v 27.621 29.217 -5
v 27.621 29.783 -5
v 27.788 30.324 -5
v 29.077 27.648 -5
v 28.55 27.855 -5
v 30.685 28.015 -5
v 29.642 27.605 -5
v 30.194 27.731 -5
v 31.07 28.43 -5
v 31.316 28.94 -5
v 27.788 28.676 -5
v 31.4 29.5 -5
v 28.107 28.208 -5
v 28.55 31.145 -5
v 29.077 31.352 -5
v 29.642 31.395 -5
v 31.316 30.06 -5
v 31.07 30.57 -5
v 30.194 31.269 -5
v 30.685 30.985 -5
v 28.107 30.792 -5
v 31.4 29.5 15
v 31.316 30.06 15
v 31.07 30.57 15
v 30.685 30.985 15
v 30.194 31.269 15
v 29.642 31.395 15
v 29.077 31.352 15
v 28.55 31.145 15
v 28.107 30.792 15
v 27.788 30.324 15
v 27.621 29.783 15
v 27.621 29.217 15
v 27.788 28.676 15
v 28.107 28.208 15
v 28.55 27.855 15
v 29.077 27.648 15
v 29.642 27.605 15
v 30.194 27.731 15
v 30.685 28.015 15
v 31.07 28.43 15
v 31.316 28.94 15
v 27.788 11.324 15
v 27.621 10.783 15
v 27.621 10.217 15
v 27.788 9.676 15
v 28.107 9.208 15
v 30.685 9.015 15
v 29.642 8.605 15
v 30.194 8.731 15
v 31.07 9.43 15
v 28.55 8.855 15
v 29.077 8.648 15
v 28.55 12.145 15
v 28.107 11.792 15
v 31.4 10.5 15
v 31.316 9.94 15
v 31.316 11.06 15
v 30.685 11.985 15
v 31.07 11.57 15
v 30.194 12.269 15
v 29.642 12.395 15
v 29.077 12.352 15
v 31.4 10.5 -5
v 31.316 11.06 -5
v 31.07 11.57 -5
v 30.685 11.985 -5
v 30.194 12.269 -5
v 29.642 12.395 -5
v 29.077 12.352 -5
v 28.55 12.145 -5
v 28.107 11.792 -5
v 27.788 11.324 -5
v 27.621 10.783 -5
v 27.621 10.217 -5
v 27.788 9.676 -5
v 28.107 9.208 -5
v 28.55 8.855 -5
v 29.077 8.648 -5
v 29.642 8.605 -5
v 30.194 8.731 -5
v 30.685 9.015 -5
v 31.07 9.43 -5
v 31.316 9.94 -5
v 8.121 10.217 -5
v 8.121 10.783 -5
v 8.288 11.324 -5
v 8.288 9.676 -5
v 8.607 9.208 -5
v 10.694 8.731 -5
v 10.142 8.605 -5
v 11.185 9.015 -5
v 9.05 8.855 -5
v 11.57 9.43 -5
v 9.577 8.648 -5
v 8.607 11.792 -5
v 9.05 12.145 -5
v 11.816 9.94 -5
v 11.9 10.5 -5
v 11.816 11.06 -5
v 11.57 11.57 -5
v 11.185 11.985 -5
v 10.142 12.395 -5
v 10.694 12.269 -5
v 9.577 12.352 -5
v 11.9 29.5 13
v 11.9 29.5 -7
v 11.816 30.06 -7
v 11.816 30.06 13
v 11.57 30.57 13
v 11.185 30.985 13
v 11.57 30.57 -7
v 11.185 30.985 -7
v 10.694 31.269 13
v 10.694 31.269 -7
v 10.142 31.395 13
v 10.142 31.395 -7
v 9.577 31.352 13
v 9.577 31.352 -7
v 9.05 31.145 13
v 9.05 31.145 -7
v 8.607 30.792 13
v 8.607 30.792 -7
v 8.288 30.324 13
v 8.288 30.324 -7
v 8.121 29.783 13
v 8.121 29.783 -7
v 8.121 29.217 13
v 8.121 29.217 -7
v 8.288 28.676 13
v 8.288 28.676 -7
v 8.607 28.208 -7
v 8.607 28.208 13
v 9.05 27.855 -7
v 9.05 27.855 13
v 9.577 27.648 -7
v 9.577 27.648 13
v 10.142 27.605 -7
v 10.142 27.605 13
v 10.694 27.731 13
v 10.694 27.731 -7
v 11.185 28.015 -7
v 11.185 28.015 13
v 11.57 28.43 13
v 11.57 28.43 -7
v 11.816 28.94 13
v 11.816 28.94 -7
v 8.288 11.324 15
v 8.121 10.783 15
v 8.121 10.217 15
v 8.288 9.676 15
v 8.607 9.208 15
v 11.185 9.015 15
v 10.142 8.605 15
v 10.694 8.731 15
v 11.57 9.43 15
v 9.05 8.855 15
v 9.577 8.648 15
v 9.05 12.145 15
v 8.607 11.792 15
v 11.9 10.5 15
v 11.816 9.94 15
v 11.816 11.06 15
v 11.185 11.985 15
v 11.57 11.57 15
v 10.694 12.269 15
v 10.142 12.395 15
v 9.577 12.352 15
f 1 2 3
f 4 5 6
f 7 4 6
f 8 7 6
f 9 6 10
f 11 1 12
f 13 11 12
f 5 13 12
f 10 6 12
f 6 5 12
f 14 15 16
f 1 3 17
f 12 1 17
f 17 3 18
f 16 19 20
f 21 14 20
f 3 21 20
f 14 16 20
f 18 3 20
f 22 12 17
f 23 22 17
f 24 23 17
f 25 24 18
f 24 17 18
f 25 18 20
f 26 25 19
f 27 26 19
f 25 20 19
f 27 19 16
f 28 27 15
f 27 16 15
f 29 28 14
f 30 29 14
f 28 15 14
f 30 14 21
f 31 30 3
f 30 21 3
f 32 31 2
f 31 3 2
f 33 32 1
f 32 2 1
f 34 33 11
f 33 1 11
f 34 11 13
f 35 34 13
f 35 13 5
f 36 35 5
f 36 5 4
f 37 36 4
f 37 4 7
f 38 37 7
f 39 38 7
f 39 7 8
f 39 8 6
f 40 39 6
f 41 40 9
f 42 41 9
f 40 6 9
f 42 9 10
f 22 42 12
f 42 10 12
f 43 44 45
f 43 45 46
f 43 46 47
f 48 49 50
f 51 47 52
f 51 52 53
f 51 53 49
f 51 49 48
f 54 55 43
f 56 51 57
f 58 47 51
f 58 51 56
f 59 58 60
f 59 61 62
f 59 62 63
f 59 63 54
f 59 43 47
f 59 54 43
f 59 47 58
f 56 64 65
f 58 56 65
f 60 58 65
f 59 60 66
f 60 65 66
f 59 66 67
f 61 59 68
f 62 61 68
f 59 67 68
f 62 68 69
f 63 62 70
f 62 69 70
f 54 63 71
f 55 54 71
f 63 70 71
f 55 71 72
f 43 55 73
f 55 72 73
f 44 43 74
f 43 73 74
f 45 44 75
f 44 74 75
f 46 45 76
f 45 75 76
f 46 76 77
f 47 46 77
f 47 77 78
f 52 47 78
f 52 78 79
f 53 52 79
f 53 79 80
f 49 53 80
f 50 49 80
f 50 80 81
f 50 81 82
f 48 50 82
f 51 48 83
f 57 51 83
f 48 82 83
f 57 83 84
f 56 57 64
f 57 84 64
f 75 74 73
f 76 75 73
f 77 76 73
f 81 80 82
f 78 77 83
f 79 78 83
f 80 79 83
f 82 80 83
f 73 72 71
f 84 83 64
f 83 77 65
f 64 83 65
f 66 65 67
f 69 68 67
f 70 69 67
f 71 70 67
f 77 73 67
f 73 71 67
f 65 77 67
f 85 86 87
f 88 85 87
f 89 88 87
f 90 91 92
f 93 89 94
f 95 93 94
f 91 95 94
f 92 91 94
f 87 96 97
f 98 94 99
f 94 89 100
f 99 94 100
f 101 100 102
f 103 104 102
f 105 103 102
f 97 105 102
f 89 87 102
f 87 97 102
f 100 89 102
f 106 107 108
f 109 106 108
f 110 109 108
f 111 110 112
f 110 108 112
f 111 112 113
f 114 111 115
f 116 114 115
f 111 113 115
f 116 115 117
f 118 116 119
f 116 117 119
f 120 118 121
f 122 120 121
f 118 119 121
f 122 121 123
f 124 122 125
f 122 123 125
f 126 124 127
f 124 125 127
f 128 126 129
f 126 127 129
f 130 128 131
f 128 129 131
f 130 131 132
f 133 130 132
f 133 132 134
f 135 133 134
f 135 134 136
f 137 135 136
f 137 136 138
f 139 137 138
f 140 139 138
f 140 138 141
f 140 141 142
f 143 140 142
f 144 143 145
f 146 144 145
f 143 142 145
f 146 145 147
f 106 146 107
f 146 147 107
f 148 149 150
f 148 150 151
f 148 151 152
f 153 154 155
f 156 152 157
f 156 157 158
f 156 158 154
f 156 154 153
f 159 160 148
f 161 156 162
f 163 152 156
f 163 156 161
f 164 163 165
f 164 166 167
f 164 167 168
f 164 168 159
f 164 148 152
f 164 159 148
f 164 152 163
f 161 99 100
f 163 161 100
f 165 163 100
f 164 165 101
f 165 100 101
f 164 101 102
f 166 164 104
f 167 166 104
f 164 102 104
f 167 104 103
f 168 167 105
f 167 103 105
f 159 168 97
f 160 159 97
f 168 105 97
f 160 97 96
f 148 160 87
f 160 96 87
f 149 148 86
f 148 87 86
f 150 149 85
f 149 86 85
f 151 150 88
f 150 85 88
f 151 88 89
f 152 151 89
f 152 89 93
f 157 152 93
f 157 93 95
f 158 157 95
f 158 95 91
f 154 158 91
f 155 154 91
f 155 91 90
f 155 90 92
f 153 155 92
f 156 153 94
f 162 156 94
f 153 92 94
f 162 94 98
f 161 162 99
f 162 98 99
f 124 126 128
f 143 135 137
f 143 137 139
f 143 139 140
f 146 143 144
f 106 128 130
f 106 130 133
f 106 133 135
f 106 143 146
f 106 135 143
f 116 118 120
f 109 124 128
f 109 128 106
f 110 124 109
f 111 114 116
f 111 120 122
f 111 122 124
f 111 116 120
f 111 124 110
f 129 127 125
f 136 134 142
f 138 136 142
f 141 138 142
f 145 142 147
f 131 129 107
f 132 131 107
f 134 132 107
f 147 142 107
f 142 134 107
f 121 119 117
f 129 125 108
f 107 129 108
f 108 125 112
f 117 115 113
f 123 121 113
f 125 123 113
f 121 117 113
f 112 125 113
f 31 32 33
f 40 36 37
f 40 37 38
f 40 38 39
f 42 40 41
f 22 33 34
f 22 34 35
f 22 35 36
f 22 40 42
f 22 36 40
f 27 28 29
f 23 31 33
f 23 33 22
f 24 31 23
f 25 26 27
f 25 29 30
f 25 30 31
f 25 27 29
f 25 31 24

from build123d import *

# Parameters (mm, degrees)
CYLINDER009_R     = 1.9
CYLINDER009_DEPTH = 20
CYLINDER011_R     = 1.9
CYLINDER011_DEPTH = 20
CYLINDER010_R     = 1.9
CYLINDER010_DEPTH = 20
CYLINDER008_R     = 1.9
CYLINDER008_DEPTH = 20


with BuildPart() as cylinder009:
    # Cylinder009 → Cylinder009 (new body)
    with BuildSketch(Plane(origin=(29.5, 10.5, -5), x_dir=(1, 0, 0), z_dir=(0, 0, 1))):
        Circle(CYLINDER009_R)
    extrude(amount=CYLINDER009_DEPTH)


with BuildPart() as cylinder011:
    # Cylinder011 → Cylinder011 (new body)
    with BuildSketch(Plane(origin=(10, 29.5, -7), x_dir=(1, 0, 0), z_dir=(0, 0, 1))):
        Circle(CYLINDER011_R)
    extrude(amount=CYLINDER011_DEPTH)


with BuildPart() as cylinder010:
    # Cylinder010 → Cylinder010 (new body)
    with BuildSketch(Plane(origin=(29.5, 29.5, -5), x_dir=(1, 0, 0), z_dir=(0, 0, 1))):
        Circle(CYLINDER010_R)
    extrude(amount=CYLINDER010_DEPTH)


with BuildPart() as m2_screw_holes:
    # Cylinder008 → Cylinder008 (new body)
    with BuildSketch(Plane(origin=(10, 10.5, -5), x_dir=(1, 0, 0), z_dir=(0, 0, 1))):
        Circle(CYLINDER008_R)
    extrude(amount=CYLINDER008_DEPTH)

    # Fusion021: union Cylinder009, Cylinder011, Cylinder010
    add(cylinder009.part)
    add(cylinder011.part)
    add(cylinder010.part)


solid = m2_screw_holes.part
